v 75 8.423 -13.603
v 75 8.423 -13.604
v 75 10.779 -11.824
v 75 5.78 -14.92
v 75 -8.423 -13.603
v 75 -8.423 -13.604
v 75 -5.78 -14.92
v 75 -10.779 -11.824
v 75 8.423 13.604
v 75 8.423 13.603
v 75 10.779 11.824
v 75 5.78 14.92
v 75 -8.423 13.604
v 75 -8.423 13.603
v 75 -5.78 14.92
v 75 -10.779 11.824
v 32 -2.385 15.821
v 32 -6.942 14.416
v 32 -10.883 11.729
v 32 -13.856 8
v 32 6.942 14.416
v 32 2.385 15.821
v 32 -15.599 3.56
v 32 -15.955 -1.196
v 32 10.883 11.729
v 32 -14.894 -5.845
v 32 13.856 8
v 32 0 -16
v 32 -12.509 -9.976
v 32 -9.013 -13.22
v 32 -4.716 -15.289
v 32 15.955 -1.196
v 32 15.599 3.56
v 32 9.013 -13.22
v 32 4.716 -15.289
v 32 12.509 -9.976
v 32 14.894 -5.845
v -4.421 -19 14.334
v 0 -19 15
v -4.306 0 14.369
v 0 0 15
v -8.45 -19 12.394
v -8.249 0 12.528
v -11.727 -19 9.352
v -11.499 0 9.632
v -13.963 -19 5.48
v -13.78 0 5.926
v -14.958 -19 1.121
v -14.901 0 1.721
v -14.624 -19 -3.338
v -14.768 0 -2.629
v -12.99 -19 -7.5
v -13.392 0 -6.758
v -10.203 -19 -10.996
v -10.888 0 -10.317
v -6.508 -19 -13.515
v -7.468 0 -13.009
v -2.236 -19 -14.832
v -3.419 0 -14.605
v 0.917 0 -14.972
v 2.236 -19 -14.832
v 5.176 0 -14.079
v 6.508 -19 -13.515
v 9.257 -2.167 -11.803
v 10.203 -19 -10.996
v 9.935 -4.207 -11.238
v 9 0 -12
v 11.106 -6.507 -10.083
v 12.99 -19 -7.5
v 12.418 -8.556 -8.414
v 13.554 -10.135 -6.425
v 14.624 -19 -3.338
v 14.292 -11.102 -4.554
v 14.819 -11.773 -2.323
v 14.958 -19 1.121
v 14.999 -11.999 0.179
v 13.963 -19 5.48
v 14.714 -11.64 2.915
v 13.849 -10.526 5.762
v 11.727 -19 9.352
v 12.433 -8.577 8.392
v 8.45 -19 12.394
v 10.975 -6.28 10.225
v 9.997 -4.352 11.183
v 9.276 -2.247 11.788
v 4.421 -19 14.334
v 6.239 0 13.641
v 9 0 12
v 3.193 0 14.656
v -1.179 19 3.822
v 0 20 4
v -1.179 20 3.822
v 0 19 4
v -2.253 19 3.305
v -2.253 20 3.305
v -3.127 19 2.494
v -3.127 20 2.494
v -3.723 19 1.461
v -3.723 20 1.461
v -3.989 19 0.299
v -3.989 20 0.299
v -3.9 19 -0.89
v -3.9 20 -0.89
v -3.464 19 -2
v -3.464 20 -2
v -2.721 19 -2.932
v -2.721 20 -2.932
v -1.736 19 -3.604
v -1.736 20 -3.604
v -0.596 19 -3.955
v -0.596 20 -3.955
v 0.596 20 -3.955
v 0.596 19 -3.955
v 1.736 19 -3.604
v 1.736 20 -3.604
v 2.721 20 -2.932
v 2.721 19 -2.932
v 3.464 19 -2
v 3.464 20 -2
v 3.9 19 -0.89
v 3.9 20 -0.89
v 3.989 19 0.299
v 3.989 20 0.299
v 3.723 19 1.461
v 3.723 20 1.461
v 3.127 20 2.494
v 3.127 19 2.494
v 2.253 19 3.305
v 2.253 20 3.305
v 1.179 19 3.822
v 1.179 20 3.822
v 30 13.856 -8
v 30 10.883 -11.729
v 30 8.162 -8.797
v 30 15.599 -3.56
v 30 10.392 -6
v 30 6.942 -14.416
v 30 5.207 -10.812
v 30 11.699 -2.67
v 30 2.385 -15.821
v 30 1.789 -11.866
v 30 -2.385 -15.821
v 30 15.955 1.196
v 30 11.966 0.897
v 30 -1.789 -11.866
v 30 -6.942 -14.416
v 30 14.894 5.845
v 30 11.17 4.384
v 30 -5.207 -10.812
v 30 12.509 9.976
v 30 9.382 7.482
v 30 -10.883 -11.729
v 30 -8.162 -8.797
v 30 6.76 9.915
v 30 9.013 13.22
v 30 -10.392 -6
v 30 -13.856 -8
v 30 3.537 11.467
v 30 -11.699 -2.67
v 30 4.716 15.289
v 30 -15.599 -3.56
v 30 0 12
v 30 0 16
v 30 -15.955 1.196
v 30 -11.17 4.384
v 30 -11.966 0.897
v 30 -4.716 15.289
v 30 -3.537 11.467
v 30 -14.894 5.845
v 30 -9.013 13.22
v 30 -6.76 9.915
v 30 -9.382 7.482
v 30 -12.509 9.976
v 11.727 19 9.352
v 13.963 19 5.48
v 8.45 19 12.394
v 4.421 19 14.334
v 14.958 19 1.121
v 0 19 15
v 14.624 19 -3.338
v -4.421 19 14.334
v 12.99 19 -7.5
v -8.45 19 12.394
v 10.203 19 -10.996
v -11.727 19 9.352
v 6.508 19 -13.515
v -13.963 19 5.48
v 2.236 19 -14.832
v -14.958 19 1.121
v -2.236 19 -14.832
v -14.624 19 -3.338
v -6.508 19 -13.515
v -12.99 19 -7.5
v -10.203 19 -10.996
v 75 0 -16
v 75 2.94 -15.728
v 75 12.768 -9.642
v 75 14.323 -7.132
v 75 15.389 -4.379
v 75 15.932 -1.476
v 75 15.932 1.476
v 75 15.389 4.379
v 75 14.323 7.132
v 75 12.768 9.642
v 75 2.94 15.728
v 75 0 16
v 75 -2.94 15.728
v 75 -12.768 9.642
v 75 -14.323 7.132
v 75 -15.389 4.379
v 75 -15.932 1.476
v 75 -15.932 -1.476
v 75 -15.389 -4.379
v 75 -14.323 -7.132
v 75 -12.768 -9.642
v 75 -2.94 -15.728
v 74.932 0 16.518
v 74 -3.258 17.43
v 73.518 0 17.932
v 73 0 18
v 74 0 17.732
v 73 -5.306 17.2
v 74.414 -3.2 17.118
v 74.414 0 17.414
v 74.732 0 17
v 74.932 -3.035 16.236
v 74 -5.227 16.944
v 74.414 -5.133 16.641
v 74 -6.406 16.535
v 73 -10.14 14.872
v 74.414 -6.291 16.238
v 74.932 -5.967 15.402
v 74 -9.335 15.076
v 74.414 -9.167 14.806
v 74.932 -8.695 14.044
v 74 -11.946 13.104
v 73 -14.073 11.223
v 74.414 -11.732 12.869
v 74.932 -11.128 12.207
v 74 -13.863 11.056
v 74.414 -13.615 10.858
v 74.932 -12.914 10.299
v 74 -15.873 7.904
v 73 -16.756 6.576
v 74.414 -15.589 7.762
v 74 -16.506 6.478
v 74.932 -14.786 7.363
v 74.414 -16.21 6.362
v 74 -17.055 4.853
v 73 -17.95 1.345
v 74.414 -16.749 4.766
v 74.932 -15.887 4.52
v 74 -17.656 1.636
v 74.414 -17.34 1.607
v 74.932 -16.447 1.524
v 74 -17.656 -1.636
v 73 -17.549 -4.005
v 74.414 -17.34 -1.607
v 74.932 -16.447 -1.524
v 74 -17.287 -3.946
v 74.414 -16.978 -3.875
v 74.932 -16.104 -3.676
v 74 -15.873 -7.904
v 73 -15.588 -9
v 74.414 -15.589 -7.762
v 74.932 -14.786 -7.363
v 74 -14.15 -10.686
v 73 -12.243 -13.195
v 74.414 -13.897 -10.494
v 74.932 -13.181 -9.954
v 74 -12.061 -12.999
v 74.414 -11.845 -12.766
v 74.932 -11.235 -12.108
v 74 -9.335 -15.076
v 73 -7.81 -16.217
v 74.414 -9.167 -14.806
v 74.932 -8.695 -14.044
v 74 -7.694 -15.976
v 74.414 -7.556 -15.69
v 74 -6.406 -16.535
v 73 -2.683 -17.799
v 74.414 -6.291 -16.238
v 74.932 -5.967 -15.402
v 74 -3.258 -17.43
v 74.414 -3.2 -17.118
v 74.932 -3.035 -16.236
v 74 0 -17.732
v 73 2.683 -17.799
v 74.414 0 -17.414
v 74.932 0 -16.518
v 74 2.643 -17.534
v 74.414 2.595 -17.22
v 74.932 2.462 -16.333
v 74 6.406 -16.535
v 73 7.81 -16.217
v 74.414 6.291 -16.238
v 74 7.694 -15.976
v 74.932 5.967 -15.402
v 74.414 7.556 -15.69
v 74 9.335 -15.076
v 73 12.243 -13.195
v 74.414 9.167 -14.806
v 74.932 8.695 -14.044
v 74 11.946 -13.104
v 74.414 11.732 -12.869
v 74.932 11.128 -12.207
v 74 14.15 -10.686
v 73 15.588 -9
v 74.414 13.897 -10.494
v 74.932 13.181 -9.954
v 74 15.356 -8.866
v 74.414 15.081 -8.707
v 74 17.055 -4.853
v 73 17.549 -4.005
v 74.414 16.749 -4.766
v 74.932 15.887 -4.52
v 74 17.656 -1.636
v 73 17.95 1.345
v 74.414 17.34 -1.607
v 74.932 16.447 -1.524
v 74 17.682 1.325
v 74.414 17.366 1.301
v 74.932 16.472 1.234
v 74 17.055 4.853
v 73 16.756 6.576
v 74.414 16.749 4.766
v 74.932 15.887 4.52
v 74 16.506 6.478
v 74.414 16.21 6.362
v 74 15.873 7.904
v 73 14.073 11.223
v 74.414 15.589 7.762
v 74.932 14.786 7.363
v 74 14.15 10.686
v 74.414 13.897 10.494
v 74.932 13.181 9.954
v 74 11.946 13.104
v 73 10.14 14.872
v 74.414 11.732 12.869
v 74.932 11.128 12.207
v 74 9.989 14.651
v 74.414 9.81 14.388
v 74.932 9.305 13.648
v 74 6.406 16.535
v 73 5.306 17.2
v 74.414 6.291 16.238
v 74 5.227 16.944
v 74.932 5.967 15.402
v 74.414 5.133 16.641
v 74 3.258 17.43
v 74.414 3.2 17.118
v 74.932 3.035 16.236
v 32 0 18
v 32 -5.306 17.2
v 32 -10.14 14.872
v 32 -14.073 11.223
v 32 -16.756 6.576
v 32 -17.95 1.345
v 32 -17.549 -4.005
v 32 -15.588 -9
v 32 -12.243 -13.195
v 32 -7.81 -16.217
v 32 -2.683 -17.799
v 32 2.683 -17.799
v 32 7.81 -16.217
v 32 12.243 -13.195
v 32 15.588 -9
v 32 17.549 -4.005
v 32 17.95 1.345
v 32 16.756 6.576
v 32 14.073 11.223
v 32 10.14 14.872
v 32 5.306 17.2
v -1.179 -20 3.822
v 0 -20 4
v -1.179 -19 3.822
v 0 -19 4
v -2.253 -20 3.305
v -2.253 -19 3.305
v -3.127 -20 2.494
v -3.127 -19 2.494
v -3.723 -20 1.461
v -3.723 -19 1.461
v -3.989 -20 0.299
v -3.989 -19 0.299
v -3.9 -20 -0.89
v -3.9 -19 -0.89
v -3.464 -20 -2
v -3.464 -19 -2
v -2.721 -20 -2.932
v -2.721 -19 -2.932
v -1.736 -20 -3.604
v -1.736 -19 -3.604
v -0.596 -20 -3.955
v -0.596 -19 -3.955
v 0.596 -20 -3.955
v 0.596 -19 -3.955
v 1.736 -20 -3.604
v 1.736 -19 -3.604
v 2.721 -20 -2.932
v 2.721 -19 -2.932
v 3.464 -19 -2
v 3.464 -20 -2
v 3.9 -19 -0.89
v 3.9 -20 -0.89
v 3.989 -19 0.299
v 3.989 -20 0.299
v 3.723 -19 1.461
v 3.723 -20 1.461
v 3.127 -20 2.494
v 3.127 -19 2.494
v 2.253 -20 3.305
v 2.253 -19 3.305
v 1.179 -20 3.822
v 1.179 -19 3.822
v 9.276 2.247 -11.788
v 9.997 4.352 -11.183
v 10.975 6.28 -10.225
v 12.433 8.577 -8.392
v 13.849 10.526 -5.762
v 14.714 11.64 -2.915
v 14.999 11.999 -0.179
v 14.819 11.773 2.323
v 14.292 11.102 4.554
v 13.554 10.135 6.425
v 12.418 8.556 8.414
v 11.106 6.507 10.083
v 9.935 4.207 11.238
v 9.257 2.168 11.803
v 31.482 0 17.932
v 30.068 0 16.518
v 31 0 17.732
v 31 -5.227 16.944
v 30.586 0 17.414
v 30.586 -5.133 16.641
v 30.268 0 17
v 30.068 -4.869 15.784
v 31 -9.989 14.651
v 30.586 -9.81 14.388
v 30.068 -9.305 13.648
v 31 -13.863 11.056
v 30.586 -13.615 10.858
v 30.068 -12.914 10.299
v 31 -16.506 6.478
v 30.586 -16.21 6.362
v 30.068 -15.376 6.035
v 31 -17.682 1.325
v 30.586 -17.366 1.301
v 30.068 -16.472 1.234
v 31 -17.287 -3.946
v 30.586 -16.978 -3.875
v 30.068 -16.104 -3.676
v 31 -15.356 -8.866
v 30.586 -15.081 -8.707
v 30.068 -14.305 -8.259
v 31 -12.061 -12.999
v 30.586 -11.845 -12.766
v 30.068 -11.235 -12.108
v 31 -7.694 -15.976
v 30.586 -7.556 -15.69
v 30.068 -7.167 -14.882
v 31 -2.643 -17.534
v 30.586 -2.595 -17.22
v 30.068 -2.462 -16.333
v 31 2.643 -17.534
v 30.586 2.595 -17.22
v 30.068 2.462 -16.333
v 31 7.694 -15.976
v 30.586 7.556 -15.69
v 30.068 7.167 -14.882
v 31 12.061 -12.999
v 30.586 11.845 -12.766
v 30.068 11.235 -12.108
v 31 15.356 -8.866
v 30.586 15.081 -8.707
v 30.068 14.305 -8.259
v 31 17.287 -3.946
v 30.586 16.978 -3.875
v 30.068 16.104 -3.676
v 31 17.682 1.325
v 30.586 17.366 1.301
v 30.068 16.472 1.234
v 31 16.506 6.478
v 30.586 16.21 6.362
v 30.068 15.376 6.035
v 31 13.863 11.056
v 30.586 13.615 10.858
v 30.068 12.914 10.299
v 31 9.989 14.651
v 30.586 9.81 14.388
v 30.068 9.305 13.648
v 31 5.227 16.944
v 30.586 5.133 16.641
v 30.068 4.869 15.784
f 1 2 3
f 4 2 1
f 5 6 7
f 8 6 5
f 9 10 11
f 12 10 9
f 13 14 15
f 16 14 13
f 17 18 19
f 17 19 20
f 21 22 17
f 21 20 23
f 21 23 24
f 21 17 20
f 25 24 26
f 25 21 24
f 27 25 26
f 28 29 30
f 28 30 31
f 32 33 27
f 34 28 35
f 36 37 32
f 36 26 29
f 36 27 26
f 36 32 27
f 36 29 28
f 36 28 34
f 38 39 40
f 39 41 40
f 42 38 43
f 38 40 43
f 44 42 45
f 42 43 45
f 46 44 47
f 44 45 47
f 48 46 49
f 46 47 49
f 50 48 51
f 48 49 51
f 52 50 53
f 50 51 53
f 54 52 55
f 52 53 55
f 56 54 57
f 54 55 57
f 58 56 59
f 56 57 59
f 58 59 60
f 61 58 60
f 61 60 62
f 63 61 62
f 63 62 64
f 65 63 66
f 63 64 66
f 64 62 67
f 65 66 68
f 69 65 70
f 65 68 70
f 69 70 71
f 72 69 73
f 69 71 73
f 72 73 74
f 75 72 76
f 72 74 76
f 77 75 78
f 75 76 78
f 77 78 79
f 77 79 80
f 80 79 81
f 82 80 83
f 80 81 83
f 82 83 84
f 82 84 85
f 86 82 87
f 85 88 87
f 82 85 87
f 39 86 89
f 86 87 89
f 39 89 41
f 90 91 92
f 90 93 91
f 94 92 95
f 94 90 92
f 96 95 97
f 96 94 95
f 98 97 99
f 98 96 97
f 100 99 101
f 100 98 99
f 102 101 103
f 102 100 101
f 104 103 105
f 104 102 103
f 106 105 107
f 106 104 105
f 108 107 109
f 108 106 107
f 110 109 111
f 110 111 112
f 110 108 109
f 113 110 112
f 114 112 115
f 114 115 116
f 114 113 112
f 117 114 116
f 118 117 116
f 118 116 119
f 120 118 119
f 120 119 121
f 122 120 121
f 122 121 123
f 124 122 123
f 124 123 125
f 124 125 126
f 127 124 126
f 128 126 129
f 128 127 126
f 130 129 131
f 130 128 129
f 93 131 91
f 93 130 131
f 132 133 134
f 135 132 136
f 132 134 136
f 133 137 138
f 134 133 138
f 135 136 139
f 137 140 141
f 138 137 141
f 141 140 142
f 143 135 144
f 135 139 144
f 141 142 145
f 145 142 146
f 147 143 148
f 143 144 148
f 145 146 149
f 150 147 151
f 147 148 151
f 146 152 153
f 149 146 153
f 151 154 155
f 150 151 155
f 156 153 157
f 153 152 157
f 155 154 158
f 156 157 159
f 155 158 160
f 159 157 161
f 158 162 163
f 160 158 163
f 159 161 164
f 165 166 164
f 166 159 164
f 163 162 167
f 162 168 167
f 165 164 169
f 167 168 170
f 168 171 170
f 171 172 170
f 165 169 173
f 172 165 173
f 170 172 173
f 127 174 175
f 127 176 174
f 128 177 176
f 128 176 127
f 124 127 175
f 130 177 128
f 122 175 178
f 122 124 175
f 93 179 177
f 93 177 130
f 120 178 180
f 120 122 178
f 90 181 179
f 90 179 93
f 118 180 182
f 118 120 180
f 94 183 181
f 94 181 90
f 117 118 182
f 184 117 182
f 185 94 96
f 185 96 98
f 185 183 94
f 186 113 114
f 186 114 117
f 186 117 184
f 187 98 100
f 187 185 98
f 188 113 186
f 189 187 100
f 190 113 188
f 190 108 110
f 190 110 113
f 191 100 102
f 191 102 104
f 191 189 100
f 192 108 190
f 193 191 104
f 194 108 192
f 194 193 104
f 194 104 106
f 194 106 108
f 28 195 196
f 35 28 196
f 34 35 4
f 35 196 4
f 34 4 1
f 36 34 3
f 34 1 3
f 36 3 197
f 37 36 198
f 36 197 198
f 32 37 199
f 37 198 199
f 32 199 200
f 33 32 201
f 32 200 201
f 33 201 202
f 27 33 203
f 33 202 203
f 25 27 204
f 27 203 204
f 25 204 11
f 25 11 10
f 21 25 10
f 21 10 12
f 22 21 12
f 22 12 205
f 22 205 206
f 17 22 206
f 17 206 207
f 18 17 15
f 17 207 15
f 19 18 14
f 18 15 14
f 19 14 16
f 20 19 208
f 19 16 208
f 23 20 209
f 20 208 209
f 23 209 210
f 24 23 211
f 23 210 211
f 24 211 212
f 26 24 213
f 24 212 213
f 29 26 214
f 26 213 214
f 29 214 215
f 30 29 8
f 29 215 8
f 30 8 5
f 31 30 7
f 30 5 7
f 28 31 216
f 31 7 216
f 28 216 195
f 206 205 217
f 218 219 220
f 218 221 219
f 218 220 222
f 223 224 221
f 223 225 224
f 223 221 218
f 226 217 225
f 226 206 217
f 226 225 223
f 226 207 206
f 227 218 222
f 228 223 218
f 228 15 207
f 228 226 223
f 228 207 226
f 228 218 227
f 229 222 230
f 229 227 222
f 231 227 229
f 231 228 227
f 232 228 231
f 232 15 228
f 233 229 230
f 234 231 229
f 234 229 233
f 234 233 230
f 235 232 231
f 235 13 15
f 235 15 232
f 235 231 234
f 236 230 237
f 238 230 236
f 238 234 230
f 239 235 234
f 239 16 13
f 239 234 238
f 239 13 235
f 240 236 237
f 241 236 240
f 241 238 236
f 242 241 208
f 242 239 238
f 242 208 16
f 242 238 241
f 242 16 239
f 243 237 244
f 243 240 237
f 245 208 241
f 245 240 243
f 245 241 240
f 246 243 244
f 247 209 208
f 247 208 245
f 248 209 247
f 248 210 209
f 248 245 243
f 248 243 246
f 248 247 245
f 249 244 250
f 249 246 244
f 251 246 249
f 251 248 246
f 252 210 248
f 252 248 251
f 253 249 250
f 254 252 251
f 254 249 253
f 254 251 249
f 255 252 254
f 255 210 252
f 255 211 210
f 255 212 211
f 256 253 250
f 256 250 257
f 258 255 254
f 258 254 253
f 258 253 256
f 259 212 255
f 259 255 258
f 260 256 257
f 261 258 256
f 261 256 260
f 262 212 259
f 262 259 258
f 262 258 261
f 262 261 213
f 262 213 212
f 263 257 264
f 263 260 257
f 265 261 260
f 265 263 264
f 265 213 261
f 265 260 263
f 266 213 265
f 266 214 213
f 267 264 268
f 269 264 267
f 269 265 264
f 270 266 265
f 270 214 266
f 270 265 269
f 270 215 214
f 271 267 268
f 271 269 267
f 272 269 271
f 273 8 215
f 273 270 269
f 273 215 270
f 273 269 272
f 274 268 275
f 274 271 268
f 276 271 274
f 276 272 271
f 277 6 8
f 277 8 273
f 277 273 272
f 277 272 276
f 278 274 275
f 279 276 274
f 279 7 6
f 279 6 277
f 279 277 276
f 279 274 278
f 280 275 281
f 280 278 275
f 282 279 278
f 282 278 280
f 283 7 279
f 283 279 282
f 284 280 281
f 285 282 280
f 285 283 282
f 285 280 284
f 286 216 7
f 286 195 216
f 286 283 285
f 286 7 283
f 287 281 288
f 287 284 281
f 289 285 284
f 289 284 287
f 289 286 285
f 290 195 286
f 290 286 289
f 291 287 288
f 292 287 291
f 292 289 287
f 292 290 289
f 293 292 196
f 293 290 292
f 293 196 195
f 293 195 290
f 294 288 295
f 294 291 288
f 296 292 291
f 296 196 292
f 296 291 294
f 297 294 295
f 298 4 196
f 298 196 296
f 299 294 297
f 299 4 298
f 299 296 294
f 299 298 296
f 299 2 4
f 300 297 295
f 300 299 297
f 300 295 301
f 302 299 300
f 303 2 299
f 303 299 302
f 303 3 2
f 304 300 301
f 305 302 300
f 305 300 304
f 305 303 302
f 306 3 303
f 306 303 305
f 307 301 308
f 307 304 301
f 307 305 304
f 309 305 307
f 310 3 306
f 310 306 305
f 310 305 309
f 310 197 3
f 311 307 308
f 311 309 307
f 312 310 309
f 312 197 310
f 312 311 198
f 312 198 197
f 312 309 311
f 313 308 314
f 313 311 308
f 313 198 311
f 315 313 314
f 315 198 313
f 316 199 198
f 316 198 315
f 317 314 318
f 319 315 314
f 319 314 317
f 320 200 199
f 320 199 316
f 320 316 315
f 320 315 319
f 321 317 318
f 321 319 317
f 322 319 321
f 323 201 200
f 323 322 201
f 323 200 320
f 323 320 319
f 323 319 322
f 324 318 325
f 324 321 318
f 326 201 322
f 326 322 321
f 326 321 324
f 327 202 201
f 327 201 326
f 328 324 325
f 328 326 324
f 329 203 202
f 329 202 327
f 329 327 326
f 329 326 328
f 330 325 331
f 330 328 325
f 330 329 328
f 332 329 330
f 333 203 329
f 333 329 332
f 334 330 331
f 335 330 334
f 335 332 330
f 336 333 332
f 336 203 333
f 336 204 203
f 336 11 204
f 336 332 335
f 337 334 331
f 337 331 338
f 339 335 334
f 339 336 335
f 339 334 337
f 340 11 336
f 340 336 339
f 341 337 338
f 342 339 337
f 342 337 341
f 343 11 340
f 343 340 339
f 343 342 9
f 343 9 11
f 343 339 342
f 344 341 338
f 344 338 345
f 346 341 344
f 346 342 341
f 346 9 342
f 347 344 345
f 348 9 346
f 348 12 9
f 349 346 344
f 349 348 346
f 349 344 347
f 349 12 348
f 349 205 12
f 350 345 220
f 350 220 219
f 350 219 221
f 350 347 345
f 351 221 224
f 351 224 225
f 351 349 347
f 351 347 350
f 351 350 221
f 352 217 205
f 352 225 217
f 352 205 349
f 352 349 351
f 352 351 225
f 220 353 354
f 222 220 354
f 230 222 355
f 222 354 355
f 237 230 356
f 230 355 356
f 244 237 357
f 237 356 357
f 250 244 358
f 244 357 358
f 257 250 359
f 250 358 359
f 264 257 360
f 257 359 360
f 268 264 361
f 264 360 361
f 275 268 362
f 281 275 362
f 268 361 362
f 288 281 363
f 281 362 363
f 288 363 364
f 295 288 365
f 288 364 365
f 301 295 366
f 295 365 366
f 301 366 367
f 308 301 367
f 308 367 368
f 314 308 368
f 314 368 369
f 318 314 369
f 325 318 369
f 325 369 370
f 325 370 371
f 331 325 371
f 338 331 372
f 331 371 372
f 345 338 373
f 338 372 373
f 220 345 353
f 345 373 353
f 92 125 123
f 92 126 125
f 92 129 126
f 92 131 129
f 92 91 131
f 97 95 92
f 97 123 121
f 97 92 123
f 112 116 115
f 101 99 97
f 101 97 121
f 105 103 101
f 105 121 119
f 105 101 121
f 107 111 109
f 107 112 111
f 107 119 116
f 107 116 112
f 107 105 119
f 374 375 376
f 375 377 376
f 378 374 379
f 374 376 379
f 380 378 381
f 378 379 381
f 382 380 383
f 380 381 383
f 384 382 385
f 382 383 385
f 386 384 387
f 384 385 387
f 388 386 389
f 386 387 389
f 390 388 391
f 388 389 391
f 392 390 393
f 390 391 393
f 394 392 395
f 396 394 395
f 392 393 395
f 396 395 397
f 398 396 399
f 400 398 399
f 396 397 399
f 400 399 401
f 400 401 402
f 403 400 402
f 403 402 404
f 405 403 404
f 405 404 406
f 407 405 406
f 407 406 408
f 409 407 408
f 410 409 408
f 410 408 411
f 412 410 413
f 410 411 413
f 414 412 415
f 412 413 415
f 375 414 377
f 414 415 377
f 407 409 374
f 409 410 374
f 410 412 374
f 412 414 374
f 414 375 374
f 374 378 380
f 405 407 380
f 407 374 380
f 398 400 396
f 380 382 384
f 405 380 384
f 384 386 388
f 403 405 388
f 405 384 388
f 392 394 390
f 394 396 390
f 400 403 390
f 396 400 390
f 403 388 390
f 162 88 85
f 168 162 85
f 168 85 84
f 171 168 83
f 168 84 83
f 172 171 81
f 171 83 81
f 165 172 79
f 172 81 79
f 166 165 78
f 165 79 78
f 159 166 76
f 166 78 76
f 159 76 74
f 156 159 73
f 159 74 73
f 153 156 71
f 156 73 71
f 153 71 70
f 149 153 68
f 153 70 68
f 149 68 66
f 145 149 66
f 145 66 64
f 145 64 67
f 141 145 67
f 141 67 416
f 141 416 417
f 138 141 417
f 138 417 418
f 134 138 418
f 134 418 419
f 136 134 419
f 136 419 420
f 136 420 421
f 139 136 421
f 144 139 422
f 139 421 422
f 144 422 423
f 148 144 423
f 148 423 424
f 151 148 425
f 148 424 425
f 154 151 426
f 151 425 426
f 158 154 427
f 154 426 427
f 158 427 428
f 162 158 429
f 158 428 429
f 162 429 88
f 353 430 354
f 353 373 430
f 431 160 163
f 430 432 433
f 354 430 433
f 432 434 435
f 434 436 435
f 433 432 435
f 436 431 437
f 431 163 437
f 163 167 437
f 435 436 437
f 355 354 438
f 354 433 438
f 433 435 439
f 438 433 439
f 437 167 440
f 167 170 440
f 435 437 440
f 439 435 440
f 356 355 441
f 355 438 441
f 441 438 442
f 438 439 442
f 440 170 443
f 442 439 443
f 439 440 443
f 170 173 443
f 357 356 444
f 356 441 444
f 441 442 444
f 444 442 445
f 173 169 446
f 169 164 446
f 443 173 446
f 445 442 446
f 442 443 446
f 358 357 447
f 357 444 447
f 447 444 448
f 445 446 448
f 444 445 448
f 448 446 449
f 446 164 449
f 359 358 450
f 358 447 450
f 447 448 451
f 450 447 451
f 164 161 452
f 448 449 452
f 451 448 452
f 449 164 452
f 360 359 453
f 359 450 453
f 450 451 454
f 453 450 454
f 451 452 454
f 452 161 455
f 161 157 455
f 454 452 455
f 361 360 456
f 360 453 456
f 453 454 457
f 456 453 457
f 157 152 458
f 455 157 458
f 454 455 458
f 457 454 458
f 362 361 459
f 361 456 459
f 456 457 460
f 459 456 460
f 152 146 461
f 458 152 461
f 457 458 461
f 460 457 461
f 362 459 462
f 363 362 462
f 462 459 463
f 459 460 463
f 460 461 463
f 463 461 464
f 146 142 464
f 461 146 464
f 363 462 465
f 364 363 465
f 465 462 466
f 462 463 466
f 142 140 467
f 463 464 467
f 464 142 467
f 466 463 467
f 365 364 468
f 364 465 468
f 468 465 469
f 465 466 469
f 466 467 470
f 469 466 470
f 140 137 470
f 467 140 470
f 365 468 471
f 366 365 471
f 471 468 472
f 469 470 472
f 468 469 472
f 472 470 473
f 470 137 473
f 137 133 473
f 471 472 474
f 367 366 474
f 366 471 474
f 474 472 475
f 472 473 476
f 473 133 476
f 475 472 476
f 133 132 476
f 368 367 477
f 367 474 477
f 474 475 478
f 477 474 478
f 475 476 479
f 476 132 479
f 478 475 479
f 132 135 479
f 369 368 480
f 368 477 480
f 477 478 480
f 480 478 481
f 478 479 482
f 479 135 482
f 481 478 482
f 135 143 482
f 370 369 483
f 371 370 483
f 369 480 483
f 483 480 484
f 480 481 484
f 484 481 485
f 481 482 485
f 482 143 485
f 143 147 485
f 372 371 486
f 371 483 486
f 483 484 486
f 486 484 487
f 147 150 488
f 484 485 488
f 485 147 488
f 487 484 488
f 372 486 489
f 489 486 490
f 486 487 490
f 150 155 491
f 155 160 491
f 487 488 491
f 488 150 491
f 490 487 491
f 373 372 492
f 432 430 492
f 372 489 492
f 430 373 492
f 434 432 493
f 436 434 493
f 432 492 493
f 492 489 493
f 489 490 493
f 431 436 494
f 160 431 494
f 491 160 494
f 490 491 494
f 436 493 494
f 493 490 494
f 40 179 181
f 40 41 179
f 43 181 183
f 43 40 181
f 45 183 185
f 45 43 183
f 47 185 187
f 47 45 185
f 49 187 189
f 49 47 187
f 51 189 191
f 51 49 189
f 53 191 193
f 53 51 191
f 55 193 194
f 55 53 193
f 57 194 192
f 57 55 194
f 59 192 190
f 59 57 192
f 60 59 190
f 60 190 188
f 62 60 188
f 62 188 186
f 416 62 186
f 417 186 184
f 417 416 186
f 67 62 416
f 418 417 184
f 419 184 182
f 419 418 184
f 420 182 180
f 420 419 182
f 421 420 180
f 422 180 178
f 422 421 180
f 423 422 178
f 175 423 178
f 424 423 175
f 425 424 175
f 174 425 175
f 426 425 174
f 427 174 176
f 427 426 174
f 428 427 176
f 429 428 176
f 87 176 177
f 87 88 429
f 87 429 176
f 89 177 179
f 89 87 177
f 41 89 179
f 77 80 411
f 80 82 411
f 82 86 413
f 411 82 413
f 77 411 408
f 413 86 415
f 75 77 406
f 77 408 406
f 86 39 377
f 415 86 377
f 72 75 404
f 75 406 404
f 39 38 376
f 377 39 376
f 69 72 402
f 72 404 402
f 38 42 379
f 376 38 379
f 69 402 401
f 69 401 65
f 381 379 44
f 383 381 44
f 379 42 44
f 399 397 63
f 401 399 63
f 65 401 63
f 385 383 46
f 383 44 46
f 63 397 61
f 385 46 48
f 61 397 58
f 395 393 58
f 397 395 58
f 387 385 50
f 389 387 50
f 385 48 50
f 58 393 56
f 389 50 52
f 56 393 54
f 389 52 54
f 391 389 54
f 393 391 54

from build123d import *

# Parameters (mm, degrees)
SKETCH_2_R          = 12
EXTRUDE_1_DEPTH     = 30
SKETCH_3_R          = 18
EXTRUDE_2_DEPTH     = 45
SKETCH_4_R          = 16
CUT_EXTRUDE_1_DEPTH = 43
FILLET_1_R          = 2


with BuildPart() as part:
    # 草图1 → 旋转1 (revolve)
    with BuildSketch(Plane.XY, mode=Mode.PRIVATE) as revolve_1_sk:
        Polygon((0, 20), (-4, 20), (-4, 19), (-15, 19), (-15, 0), (0, 0), align=None)
    revolve_1 = revolve(revolve_1_sk.sketch.rotate(Axis((0, 20, 0), (0, -1, 0)), 270), axis=Axis((0, 20, 0), (0, -1, 0)))

    # 镜向1: 旋转1 across plane
    add(revolve_1.mirror(Plane(origin=(0, 0, 0), x_dir=(0, 0, 1), z_dir=(0, -1, 0))))

    # 草图2 → 凸台-拉伸1 (add)
    with BuildSketch(Plane(origin=(0, 0, 0), x_dir=(0, 0, -1), z_dir=(1, 0, 0))):
        with Locations(Location((0, 0, 0), (0, 0, 180))):
            Circle(SKETCH_2_R)
    extrude(amount=EXTRUDE_1_DEPTH)

    # 草图3 → 凸台-拉伸2 (add)
    with BuildSketch(Plane(origin=(30, 0, 0), x_dir=(0, 0, -1), z_dir=(1, 0, 0))):
        with Locations(Location((0, 0, 0), (0, 0, 180))):
            Circle(SKETCH_3_R)
    extrude(amount=EXTRUDE_2_DEPTH)

    # 草图4 → 切除-拉伸1 (cut)
    with BuildSketch(Plane(origin=(75, 0, 0), x_dir=(0, 0, -1), z_dir=(1, 0, 0))):
        Circle(SKETCH_4_R)
    extrude(amount=-CUT_EXTRUDE_1_DEPTH, mode=Mode.SUBTRACT)

    # 圆角1
    fillet_1_edges = [part.edges().sort_by_distance(p)[0] for p in [
        (30, 0, -18),
        (75, 0, -18),
    ]]
    fillet(fillet_1_edges, radius=FILLET_1_R - 0.0001)  # a hair under: the kernel refuses the full size


solid = part.part
